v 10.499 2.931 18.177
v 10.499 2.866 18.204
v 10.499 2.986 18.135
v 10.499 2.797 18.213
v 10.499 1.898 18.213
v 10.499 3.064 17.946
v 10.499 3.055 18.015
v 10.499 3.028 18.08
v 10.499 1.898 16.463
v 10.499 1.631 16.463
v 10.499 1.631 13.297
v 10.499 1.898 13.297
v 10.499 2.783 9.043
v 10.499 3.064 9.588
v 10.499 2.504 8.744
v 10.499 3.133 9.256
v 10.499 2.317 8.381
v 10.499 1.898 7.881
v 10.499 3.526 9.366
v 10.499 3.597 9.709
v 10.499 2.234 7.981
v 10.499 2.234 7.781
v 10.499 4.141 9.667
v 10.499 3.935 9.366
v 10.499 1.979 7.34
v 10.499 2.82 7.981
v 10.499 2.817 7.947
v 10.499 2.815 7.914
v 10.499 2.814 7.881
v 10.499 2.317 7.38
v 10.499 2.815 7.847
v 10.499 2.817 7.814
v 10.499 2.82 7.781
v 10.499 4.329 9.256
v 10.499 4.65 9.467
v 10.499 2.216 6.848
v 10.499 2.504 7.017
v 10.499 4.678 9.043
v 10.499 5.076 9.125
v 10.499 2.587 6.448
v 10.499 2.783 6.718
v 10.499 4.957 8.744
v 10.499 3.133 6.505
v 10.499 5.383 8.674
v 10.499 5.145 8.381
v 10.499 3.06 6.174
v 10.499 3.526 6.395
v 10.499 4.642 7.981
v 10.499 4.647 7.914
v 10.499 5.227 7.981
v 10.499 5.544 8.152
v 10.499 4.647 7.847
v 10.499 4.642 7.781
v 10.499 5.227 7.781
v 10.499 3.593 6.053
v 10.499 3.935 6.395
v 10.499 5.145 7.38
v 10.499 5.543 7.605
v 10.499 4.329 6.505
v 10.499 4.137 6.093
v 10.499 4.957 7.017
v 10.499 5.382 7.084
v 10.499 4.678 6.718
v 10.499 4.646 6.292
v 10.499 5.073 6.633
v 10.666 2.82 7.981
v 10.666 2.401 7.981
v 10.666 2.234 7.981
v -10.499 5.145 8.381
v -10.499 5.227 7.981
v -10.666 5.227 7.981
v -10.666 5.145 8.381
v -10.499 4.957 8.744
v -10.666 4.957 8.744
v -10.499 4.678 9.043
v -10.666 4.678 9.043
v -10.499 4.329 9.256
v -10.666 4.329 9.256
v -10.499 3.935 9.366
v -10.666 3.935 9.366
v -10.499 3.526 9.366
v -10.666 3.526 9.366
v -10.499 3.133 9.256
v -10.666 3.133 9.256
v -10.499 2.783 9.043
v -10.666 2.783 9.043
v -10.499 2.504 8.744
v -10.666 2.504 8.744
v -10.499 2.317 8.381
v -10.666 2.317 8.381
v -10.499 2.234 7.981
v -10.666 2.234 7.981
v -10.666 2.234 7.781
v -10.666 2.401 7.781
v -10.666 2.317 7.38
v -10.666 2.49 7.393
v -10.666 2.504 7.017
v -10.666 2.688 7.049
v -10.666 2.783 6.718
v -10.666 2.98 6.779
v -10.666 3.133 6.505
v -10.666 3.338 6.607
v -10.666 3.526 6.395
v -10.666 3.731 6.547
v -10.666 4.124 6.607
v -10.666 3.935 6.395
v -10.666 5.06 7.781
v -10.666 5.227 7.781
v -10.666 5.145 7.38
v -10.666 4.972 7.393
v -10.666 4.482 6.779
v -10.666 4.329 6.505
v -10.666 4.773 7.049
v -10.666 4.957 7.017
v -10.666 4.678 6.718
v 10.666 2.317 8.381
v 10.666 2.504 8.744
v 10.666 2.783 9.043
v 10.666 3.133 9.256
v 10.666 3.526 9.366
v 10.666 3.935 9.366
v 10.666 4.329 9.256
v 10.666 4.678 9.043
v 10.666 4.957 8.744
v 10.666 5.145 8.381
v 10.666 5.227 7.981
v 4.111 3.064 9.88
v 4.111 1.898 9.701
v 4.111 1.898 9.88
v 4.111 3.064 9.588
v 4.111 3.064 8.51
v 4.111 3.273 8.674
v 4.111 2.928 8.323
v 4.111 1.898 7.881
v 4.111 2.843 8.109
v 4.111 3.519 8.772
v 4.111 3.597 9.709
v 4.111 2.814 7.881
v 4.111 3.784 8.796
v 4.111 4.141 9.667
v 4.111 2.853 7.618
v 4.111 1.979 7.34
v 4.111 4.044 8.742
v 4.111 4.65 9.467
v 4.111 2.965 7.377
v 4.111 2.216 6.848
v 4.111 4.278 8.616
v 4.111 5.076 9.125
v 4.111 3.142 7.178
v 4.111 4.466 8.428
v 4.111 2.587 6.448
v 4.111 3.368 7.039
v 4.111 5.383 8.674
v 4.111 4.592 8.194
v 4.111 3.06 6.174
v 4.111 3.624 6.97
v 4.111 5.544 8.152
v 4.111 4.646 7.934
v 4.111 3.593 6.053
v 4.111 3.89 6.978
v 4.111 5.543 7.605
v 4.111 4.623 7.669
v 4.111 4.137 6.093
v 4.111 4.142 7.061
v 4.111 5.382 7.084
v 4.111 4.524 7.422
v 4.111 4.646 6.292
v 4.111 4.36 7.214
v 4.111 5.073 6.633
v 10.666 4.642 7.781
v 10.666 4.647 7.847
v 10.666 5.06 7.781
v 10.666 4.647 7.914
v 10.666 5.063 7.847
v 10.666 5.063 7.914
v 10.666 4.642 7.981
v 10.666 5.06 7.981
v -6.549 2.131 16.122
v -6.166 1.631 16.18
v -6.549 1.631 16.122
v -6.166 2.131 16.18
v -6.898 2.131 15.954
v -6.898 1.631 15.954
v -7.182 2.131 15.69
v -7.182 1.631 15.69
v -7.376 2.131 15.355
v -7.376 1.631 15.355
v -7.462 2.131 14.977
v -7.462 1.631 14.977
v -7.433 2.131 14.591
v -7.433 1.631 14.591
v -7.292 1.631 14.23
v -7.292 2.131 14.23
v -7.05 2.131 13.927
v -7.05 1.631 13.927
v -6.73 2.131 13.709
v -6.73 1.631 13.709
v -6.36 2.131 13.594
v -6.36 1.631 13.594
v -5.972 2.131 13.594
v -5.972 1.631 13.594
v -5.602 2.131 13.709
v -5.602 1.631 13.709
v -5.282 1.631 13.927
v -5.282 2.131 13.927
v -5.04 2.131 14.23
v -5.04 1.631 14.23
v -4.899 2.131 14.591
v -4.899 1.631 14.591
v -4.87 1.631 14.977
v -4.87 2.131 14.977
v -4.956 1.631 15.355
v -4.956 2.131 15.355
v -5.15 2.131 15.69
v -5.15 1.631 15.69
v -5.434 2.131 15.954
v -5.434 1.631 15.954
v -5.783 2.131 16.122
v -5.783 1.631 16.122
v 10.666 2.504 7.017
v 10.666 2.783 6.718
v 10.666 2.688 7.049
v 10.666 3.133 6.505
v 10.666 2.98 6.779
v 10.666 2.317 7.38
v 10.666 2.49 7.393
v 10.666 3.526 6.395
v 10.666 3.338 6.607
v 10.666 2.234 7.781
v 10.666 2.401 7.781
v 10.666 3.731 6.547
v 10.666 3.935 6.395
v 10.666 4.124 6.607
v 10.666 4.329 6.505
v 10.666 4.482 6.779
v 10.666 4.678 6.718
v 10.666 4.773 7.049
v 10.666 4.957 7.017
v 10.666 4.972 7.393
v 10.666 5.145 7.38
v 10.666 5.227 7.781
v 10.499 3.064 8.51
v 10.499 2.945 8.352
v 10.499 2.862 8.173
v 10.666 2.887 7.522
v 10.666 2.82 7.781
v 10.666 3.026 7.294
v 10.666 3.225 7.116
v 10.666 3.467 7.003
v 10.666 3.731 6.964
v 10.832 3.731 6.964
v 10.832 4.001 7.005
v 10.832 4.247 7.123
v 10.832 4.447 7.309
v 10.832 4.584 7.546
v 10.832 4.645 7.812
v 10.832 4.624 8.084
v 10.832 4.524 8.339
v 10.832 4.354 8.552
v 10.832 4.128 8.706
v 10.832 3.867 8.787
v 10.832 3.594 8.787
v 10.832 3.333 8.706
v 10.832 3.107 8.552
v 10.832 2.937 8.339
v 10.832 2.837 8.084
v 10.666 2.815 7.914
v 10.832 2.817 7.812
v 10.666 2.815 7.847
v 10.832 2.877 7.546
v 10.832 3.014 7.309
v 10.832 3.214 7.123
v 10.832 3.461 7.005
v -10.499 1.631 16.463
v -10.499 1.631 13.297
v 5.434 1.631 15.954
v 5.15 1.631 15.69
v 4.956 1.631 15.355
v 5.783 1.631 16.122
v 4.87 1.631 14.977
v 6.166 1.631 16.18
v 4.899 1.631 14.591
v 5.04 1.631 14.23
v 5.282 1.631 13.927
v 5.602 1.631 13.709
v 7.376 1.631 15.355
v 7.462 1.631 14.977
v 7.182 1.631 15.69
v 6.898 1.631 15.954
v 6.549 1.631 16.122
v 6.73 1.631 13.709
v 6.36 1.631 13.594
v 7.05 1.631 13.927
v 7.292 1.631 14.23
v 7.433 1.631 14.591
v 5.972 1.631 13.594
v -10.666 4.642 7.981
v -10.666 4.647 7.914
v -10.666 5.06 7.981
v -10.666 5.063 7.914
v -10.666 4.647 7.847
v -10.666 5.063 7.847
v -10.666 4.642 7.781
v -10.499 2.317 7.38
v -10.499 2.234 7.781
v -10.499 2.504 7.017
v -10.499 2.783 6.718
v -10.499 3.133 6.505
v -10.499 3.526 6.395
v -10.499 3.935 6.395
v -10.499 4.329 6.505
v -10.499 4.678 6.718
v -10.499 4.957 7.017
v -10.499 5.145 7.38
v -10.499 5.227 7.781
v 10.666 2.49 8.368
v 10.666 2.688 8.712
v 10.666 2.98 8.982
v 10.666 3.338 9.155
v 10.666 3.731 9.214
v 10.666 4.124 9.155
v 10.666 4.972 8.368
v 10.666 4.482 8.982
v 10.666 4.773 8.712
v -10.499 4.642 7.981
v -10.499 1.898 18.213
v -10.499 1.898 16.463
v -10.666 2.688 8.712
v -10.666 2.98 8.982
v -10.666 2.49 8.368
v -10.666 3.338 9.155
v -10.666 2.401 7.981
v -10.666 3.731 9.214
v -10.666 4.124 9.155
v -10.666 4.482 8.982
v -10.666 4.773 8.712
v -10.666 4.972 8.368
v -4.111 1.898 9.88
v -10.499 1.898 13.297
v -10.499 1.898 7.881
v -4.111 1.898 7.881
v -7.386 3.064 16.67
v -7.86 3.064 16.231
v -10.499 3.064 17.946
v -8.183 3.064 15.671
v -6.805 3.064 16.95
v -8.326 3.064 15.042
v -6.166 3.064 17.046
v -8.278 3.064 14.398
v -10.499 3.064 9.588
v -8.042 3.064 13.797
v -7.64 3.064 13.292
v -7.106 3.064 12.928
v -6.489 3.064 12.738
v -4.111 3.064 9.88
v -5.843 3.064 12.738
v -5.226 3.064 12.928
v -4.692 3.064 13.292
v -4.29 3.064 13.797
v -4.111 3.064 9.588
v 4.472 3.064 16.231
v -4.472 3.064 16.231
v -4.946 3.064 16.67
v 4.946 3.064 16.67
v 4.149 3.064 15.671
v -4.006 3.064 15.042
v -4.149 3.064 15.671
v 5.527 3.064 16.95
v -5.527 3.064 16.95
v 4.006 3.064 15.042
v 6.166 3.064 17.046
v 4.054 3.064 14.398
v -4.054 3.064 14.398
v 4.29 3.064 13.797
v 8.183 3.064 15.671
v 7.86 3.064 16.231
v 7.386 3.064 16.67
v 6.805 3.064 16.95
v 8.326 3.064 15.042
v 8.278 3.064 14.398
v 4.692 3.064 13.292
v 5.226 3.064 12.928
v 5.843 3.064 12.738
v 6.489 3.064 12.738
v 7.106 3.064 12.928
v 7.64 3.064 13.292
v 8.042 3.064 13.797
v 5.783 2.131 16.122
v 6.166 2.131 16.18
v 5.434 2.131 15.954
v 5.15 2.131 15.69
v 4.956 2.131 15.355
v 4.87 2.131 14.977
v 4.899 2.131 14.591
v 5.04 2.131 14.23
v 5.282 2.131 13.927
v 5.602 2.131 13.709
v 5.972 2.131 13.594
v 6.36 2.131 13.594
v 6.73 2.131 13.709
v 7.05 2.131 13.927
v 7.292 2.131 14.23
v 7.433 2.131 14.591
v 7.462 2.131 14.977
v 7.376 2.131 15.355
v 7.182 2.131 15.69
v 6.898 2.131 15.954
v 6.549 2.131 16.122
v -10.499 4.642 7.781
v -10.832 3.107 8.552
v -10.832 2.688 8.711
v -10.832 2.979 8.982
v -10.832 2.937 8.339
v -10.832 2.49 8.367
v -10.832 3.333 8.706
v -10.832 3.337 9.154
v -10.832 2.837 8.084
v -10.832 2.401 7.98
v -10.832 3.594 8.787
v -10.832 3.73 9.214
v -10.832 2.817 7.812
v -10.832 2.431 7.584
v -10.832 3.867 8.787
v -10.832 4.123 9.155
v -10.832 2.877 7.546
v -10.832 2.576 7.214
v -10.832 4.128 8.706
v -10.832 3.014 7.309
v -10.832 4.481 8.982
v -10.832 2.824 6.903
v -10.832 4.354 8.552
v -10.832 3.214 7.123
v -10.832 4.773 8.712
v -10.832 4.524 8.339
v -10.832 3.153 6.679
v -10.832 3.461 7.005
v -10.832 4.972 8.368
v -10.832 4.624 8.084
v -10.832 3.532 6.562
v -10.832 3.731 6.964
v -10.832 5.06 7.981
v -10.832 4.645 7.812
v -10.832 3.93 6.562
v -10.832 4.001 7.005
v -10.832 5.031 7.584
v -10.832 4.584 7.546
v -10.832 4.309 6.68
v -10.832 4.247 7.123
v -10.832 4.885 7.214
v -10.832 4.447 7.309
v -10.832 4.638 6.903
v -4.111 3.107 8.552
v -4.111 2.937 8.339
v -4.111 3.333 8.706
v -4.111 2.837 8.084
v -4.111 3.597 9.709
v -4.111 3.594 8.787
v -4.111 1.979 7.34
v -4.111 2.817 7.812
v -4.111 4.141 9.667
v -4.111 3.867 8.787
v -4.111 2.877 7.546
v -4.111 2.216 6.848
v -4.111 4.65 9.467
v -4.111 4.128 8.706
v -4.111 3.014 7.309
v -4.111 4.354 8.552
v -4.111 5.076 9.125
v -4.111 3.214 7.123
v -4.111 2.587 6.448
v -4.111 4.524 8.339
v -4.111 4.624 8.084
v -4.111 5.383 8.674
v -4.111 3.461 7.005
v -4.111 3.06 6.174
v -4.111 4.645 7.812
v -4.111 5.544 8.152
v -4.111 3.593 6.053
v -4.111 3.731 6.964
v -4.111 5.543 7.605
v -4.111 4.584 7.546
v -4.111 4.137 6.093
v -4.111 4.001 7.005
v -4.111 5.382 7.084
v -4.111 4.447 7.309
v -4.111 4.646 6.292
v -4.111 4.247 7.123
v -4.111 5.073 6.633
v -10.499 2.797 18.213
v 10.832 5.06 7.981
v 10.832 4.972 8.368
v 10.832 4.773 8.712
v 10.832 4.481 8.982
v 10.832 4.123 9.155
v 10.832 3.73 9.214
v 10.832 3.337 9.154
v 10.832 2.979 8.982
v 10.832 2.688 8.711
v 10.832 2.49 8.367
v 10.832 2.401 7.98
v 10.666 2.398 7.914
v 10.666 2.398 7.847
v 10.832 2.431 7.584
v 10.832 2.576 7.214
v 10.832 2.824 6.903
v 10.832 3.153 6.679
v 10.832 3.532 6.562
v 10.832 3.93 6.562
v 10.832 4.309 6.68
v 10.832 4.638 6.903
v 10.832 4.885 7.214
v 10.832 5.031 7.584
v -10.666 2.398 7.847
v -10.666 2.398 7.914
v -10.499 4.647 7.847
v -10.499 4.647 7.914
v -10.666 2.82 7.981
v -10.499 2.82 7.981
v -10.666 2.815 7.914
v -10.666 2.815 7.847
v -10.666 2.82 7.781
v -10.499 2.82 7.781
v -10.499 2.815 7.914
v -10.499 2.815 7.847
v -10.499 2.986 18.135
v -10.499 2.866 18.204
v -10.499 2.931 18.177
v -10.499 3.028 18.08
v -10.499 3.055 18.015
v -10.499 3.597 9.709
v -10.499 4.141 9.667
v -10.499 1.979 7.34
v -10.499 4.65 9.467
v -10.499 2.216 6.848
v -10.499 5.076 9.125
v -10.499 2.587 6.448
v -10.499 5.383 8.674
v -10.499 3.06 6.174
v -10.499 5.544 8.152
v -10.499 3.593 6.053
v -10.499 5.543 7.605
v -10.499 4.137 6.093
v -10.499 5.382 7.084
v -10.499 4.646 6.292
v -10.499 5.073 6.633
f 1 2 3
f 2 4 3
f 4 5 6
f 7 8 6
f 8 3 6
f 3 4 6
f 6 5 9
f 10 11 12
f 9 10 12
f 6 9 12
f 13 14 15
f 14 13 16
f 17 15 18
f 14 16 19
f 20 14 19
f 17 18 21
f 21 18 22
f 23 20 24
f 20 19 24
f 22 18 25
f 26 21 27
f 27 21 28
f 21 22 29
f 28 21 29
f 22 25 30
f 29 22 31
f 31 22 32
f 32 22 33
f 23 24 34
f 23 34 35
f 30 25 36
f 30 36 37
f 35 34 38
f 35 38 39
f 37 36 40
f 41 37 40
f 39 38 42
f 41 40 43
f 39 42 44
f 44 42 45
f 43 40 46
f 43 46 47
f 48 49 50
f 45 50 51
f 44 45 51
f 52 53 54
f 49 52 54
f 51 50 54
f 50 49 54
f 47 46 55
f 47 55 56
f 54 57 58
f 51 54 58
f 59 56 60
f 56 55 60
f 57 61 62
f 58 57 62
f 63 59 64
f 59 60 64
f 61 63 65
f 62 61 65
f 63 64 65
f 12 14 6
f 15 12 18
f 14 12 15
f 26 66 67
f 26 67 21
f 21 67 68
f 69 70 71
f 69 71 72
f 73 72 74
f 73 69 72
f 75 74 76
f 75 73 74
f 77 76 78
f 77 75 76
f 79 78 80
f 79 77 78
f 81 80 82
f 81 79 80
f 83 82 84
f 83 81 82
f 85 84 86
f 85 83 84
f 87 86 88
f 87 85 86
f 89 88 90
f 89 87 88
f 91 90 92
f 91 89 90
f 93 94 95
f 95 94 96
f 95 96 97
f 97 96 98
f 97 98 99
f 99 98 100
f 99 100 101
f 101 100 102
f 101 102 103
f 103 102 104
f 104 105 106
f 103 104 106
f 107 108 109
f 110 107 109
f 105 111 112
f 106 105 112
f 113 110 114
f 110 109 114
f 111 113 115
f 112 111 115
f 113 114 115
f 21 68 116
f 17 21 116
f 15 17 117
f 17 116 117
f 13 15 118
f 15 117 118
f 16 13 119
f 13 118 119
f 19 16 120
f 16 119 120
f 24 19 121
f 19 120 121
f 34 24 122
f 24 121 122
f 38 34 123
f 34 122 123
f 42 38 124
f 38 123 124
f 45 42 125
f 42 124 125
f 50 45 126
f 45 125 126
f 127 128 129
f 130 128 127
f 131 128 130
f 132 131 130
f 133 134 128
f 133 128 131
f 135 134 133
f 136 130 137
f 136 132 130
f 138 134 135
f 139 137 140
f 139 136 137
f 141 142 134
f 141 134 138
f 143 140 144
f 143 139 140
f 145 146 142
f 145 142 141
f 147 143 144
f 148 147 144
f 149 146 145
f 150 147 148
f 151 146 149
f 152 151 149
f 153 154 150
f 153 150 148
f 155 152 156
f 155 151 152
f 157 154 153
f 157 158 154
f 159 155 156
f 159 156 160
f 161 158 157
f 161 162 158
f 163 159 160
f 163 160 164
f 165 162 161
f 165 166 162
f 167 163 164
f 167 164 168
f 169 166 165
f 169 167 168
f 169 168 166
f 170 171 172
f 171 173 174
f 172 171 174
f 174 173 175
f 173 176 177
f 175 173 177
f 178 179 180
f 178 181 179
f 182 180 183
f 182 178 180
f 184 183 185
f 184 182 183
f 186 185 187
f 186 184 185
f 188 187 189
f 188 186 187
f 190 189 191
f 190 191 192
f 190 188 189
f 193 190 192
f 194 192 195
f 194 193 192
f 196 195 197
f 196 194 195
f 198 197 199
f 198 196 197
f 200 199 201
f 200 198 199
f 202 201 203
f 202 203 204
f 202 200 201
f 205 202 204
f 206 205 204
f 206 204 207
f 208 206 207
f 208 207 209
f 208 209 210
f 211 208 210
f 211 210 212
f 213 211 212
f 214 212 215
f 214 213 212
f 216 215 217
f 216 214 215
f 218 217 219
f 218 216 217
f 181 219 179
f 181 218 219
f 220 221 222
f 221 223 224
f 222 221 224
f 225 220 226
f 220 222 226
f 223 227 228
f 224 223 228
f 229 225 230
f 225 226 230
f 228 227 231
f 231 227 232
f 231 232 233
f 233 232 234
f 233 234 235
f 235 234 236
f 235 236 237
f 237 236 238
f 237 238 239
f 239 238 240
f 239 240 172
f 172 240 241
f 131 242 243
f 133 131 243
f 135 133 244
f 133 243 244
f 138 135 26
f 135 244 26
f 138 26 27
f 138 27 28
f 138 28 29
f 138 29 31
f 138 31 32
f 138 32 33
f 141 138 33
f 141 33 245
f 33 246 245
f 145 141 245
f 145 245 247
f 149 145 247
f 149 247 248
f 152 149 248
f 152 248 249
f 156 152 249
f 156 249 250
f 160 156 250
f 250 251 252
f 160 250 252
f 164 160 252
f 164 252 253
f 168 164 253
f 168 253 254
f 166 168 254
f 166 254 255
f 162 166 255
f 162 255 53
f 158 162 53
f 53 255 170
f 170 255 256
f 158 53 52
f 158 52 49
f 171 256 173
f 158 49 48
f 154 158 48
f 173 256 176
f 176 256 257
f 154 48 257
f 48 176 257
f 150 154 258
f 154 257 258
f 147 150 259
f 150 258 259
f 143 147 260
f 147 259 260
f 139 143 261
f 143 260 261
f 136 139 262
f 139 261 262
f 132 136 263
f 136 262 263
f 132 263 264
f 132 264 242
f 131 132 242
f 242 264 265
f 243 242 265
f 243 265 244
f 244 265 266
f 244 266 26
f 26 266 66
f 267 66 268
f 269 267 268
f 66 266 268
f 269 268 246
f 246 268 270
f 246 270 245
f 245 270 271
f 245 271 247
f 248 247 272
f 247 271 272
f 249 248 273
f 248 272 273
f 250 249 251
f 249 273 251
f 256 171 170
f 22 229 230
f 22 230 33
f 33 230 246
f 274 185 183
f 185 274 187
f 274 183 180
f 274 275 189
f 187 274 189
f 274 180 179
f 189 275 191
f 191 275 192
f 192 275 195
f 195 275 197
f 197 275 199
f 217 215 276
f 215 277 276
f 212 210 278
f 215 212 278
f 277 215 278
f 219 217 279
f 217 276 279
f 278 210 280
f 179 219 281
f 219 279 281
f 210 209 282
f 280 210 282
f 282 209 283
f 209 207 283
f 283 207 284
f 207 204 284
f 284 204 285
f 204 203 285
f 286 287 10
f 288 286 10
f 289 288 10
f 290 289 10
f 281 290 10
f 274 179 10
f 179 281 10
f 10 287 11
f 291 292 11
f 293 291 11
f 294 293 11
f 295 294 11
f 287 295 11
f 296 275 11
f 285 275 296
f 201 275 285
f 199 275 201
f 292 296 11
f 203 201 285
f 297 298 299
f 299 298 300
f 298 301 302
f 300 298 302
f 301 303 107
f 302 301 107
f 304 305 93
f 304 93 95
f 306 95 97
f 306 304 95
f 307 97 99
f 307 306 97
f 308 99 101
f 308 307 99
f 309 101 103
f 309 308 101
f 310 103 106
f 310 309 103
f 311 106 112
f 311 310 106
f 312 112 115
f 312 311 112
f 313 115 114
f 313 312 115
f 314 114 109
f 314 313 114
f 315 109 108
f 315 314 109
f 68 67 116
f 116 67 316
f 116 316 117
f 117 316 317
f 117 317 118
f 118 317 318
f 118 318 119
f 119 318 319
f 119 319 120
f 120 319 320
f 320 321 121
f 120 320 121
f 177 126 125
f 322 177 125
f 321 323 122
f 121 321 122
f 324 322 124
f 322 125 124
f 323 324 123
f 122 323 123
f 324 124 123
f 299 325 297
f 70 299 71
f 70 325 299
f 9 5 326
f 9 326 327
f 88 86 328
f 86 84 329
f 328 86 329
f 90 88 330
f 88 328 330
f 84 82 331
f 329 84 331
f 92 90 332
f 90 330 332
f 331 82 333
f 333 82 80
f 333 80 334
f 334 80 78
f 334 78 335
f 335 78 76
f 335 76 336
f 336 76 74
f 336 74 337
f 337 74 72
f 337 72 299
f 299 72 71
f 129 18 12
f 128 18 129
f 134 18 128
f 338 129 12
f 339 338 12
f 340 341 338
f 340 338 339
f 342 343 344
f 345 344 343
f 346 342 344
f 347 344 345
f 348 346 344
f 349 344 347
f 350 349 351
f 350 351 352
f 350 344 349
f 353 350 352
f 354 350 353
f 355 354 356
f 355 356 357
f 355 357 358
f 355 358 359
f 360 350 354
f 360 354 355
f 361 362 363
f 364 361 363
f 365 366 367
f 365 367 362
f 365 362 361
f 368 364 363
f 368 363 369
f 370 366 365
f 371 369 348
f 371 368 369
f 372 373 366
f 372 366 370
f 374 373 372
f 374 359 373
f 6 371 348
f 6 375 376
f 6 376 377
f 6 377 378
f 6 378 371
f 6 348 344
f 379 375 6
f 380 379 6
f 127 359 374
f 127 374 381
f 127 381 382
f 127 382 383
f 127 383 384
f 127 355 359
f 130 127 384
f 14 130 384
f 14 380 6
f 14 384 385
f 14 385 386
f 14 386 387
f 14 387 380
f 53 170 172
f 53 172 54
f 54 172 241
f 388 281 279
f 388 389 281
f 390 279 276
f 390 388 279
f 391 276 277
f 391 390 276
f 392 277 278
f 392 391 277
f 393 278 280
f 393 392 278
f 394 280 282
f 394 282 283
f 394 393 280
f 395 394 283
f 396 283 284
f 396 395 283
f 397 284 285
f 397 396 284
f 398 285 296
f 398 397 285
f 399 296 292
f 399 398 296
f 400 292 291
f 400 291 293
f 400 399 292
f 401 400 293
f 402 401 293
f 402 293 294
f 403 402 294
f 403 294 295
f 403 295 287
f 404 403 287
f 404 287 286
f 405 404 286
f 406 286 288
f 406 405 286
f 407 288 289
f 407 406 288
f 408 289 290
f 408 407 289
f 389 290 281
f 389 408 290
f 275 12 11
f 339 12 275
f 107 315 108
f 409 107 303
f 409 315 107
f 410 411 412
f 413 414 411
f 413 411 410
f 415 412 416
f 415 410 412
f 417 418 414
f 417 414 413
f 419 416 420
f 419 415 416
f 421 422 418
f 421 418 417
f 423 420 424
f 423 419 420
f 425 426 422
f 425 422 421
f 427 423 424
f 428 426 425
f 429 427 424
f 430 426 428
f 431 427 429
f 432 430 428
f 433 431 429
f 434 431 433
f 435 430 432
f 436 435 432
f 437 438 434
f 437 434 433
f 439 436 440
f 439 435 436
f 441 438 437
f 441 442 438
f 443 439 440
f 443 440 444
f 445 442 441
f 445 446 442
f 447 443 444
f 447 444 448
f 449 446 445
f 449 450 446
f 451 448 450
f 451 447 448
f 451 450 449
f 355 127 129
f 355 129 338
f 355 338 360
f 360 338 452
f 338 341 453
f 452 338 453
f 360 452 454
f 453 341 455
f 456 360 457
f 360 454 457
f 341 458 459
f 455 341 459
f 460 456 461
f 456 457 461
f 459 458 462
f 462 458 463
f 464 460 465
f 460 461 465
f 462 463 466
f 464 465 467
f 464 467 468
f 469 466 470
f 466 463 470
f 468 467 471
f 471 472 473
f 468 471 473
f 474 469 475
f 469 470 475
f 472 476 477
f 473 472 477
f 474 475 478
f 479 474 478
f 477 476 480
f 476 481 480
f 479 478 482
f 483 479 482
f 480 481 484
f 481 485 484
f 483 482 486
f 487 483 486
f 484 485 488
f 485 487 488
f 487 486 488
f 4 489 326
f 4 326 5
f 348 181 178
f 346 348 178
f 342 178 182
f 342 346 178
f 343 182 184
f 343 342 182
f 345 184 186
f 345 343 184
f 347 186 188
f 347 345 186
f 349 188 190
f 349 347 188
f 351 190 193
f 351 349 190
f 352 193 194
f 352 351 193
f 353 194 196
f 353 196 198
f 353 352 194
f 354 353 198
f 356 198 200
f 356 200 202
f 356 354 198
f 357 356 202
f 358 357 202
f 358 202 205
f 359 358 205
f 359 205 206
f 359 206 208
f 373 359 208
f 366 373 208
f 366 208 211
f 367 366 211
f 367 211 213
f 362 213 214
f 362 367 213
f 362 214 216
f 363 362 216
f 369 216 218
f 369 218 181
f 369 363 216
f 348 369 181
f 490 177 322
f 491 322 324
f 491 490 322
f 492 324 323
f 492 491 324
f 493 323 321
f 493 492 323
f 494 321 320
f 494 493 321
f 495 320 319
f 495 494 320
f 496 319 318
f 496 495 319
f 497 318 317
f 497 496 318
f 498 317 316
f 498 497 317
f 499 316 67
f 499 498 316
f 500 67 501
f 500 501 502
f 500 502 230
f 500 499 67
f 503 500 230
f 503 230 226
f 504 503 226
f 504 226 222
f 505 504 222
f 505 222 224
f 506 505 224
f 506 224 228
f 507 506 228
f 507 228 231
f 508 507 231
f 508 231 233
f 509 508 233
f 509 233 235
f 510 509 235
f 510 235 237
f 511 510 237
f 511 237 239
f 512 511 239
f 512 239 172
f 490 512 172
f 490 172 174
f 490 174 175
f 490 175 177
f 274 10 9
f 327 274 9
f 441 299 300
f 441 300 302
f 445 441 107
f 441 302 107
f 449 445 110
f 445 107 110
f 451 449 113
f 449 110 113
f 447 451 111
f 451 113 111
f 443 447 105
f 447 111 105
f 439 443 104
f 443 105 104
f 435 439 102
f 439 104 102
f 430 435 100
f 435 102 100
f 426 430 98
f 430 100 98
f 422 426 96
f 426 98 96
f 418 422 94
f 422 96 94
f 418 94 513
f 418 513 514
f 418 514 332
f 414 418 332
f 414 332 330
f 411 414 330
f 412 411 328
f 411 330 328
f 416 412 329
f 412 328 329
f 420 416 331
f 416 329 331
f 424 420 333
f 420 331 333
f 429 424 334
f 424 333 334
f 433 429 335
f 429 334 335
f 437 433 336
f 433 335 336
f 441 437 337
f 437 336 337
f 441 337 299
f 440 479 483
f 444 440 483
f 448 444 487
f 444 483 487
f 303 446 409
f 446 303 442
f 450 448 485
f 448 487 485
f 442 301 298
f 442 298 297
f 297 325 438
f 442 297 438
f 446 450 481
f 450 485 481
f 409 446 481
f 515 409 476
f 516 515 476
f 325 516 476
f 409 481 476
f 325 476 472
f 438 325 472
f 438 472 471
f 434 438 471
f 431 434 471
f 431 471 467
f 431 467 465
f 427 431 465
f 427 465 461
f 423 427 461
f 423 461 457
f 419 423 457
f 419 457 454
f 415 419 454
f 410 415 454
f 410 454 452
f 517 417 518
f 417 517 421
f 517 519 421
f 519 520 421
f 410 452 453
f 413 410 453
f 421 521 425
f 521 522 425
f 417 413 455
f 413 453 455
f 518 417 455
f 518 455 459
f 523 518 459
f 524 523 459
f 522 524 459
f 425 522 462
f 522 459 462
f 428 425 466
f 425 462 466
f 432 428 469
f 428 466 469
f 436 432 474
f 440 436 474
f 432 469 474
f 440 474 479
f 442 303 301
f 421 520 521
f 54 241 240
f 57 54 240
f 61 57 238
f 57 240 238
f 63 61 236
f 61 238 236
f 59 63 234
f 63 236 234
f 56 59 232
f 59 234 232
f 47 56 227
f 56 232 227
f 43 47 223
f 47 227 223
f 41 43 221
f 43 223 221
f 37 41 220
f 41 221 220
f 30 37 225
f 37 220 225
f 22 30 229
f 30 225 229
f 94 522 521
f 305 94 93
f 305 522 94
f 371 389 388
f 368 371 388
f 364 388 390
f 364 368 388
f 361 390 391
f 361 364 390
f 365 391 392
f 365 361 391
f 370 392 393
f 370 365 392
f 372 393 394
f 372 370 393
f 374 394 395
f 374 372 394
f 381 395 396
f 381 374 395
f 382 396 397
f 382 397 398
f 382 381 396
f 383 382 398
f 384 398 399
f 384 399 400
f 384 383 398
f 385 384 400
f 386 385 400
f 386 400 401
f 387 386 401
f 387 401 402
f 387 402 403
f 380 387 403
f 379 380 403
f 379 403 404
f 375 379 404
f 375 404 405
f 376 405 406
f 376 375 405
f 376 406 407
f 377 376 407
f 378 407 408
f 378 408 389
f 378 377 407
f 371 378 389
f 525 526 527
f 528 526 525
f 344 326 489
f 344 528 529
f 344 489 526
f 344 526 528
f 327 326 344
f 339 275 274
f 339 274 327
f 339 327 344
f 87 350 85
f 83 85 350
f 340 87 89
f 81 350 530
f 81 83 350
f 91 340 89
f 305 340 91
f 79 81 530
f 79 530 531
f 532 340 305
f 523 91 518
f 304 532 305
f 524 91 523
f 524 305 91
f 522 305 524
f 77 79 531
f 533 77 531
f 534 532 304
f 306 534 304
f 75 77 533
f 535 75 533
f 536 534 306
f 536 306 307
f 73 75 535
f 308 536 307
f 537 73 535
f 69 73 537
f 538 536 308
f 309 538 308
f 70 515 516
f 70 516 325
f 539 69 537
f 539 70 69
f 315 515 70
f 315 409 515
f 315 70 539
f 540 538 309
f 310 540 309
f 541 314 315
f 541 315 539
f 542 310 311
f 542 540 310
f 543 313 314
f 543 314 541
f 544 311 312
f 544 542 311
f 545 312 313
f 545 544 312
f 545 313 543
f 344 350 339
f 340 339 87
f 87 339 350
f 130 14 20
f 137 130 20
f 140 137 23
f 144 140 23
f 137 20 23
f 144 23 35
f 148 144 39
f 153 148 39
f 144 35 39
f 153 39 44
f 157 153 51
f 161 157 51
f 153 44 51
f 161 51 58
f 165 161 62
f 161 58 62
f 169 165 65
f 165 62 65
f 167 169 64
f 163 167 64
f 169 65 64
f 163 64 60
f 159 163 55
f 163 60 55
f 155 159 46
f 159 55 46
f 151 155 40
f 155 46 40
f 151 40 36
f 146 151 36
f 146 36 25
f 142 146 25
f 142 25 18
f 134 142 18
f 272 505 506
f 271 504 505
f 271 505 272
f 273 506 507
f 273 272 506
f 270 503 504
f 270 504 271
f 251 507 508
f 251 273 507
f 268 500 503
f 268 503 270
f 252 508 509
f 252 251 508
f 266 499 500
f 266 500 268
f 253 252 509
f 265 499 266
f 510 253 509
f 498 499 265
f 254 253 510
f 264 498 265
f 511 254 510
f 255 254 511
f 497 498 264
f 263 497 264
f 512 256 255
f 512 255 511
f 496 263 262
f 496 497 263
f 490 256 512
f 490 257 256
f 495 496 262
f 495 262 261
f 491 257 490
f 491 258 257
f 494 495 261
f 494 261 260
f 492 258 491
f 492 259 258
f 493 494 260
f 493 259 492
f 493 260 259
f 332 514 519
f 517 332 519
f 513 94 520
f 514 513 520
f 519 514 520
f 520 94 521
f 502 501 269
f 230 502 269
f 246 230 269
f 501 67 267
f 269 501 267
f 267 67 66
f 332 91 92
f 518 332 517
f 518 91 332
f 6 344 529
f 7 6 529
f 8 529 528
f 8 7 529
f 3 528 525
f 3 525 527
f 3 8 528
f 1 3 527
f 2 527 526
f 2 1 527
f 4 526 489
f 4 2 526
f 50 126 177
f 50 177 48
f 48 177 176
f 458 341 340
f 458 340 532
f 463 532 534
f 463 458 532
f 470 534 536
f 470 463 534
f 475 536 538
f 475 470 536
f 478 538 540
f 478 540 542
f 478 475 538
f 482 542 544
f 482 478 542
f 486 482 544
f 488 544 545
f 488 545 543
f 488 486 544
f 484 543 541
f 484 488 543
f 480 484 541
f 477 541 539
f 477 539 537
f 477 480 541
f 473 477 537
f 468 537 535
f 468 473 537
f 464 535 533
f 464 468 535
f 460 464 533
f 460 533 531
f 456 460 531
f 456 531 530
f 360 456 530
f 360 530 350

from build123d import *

# Parameters (mm, degrees)
BOSS_EXTRUDE1_DEPTH    = 19.166666667
BOSS_EXTRUDE2_DEPTH    = 0.5
SKETCH3_W              = 5.123475383
SKETCH3_H              = 3.5
BOSS_EXTRUDE3_DEPTH    = 24.666666667
BOSS_EXTRUDE4_START    = 19.166666667
BOSS_EXTRUDE4_DEPTH    = 19.166666667
BOSS_EXTRUDE5_START    = 0.5
BOSS_EXTRUDE5_DEPTH    = 0.5
BOSS_EXTRUDE6_START    = 0.5
BOSS_EXTRUDE6_DEPTH    = 0.5
CUT_EXTRUDE1_DEPTH     = 19.166666667
SKETCH8_W              = 63
SKETCH8_H              = 3.5
BOSS_EXTRUDE7_DEPTH    = 0.338316441
SKETCH9_W              = 63
SKETCH9_H              = 5.461791824
BOSS_EXTRUDE8_DEPTH    = 0.8
CUT_EXTRUDE2_DEPTH     = 5.123475383
SKETCH11_W             = 63
SKETCH11_H             = 4.3
BOSS_EXTRUDE9_DEPTH    = 25.538208176
CUT_EXTRUDE3_DEPTH     = 0.338316441
SKETCH13_W             = 63
SKETCH13_H             = 0.8
CUT_EXTRUDE4_DEPTH     = 10.788208176
SKETCH14_W             = 24.666666666
SKETCH14_H             = 3.5
CUT_EXTRUDE5_DEPTH     = 0.538208176
BOSS_EXTRUDE10_START   = 0.5
SKETCH15_R             = 4
SKETCH15_R_2           = 2.75
BOSS_EXTRUDE10_DEPTH   = 0.5
SKETCH16_R             = 4
BOSS_EXTRUDE11_DEPTH   = 0.5
SKETCH17_W             = 5.25
SKETCH17_H             = 0.8
CUT_EXTRUDE6_DEPTH     = 72.95832127
F_10_CLEARANCE_HOLE1_D = 5.5
HOLE1_AT_2_COUNT       = 2
HOLE1_AT_2_PITCH       = 37
FILLET1_R              = 0.8
SCALE1_SCALE           = 0.3333


with BuildPart() as part:
    # Sketch1 → Boss-Extrude1 (new body)
    with BuildSketch(Plane(origin=(-12.333333333, 0, 0), x_dir=(0, 0, -1), z_dir=(1, 0, 0))):
        with BuildLine():
            Line((-5.123475383, 3.5), (-5.123475383, 0))
            Line((-5.123475383, 0), (0, 0))
            ThreePointArc((0, 0), (3.102418411, 10.041475531), (-5.123475383, 3.5))
        make_face()
    extrude(amount=-BOSS_EXTRUDE1_DEPTH)

    # Sketch2 → Boss-Extrude2 (add)
    with BuildSketch(Plane.ZY.offset(31.5)):
        with BuildLine():
            Line((-0.3, 9.989988864), (-0.3, 8.233587387))
            ThreePointArc((-0.3, 8.233587387), (0, 8.25), (0.3, 8.233587387))
            Line((0.3, 8.233587387), (0.3, 9.989988864))
            ThreePointArc((0.3, 9.989988864), (4.5, 5.5), (0.3, 1.010011136))
            Line((0.3, 1.010011136), (0.3, 2.766412613))
            ThreePointArc((0.3, 2.766412613), (0, 2.75), (-0.3, 2.766412613))
            Line((-0.3, 2.766412613), (-0.3, 1.010011136))
            ThreePointArc((-0.3, 1.010011136), (-4.5, 5.5), (-0.3, 9.989988864))
        make_face()
    extrude(amount=BOSS_EXTRUDE2_DEPTH)

    # Sketch3 → Boss-Extrude3 (add)
    with BuildSketch(Plane(origin=(-12.333333333, 0, 0), x_dir=(0, 0, -1), z_dir=(1, 0, 0))):
        with Locations((-2.561737692, 1.75)):
            Rectangle(SKETCH3_W, SKETCH3_H)
    extrude(amount=BOSS_EXTRUDE3_DEPTH)

    # Sketch4 → Boss-Extrude4 (add)
    with BuildSketch(Plane(origin=(12.333333333, 0, 0), x_dir=(0, 0, -1), z_dir=(1, 0, 0)).offset(BOSS_EXTRUDE4_START)):
        with BuildLine():
            Line((0, 0), (-5.123475383, 0))
            Line((-5.123475383, 0), (-5.123475383, 3.5))
            ThreePointArc((-5.123475383, 3.5), (3.102418411, 10.041475531), (0, 0))
        make_face()
        with BuildLine():
            Line((-1.887458609, 3.5), (0, 3.5))
            Line((0, 3.5), (0, 2.75))
            ThreePointArc((0, 2.75), (1.015504801, 8.055631038), (-1.887458609, 3.5))
        make_face(mode=Mode.SUBTRACT)
    extrude(amount=-BOSS_EXTRUDE4_DEPTH)

    # Sketch5 → Boss-Extrude5 (add)
    with BuildSketch(Plane(origin=(31.5, 0, 0), x_dir=(0, 0, -1), z_dir=(1, 0, 0)).offset(BOSS_EXTRUDE5_START)):
        with BuildLine():
            Line((-0.3, 9.989988864), (-0.3, 8.233587387))
            ThreePointArc((-0.3, 8.233587387), (-2.75, 5.5), (-0.3, 2.766412613))
            Line((-0.3, 2.766412613), (-0.3, 1.010011136))
            ThreePointArc((-0.3, 1.010011136), (-4.5, 5.5), (-0.3, 9.989988864))
        make_face()
    extrude(amount=-BOSS_EXTRUDE5_DEPTH)

    # Sketch6 → Boss-Extrude6 (add)
    with BuildSketch(Plane(origin=(31.5, 0, 0), x_dir=(0, 0, -1), z_dir=(1, 0, 0)).offset(BOSS_EXTRUDE6_START)):
        with BuildLine():
            Line((0.3, 1.010011136), (0.3, 2.766412613))
            ThreePointArc((0.3, 2.766412613), (2.75, 5.5), (0.3, 8.233587387))
            Line((0.3, 8.233587387), (0.3, 9.989988864))
            ThreePointArc((0.3, 9.989988864), (4.5, 5.5), (0.3, 1.010011136))
        make_face()
    extrude(amount=-BOSS_EXTRUDE6_DEPTH)

    # Sketch7 → Cut-Extrude1 (cut)
    with BuildSketch(Plane(origin=(31.5, 0, 0), x_dir=(0, 0, -1), z_dir=(1, 0, 0))):
        with BuildLine():
            Line((0, 3.5), (-1.887458609, 3.5))
            ThreePointArc((-1.887458609, 3.5), (-1.015504801, 2.944368962), (0, 2.75))
            Line((0, 2.75), (0, 3.5))
        make_face()
    extrude(amount=-CUT_EXTRUDE1_DEPTH, mode=Mode.SUBTRACT)

    # Sketch8 → Boss-Extrude7 (add)
    with BuildSketch(Plane.XY.offset(5.123475383)):
        with Locations((0, 1.75)):
            Rectangle(SKETCH8_W, SKETCH8_H)
    extrude(amount=BOSS_EXTRUDE7_DEPTH)

    # Sketch9 → Boss-Extrude8 (add)
    with BuildSketch(Plane.XZ):
        with Locations((0, 2.730895912)):
            Rectangle(SKETCH9_W, SKETCH9_H)
    extrude(amount=BOSS_EXTRUDE8_DEPTH)

    # Sketch10 → Cut-Extrude2 (cut)
    with BuildSketch(Plane(origin=(0, 0, 0), x_dir=(-1, 0, 0), z_dir=(0, 0, -1))):
        Polygon((12.333333333, 3.5), (-12.333333333, 3.5), (-12.333333333, 0), (-31.5, 0), (-31.5, -0.8), (31.5, -0.8), (31.5, 0), (12.333333333, 0), align=None)
    extrude(amount=-CUT_EXTRUDE2_DEPTH, mode=Mode.SUBTRACT)

    # Sketch11 → Boss-Extrude9 (add)
    with BuildSketch(Plane.XY.offset(5.461791824)):
        with Locations((0, 1.35)):
            Rectangle(SKETCH11_W, SKETCH11_H)
    extrude(amount=BOSS_EXTRUDE9_DEPTH)

    # Sketch12 → Cut-Extrude3 (cut)
    with BuildSketch(Plane(origin=(0, 0, 5.123475383), x_dir=(-1, 0, 0), z_dir=(0, 0, -1))):
        Polygon((12.333333333, 3.5), (-12.333333333, 3.5), (-12.333333333, 0), (-31.5, 0), (-31.5, -0.8), (31.5, -0.8), (31.5, 0), (12.333333333, 0), align=None)
    extrude(amount=-CUT_EXTRUDE3_DEPTH, mode=Mode.SUBTRACT)

    # Sketch13 → Cut-Extrude4 (cut)
    with BuildSketch(Plane(origin=(0, 0, 5.461791824), x_dir=(-1, 0, 0), z_dir=(0, 0, -1))):
        with Locations((0, -0.4)):
            Rectangle(SKETCH13_W, SKETCH13_H)
    extrude(amount=-CUT_EXTRUDE4_DEPTH, mode=Mode.SUBTRACT)

    # Sketch14 → Cut-Extrude5 (cut)
    with BuildSketch(Plane(origin=(0, 0, 5.461791824), x_dir=(-1, 0, 0), z_dir=(0, 0, -1))):
        with Locations((0, 1.75)):
            Rectangle(SKETCH14_W, SKETCH14_H)
    extrude(amount=-CUT_EXTRUDE5_DEPTH, mode=Mode.SUBTRACT)

    # Sketch15 → Boss-Extrude10 (add)
    with BuildSketch(Plane(origin=(32, 0, 0), x_dir=(0, 0, -1), z_dir=(1, 0, 0)).offset(BOSS_EXTRUDE10_START)):
        with Locations(Location((0, 5.5, 0), (0, 0, 94.301222305))):
            Circle(SKETCH15_R)
        with Locations((0, 5.5)):
            Circle(SKETCH15_R_2, mode=Mode.SUBTRACT)
    extrude(amount=-BOSS_EXTRUDE10_DEPTH)

    # Sketch16 → Boss-Extrude11 (add)
    with BuildSketch(Plane.ZY.offset(32)):
        with Locations(Location((0, 5.5, 0), (0, 0, 85.698777695))):
            Circle(SKETCH16_R)
    extrude(amount=BOSS_EXTRUDE11_DEPTH)

    # Sketch17 → Cut-Extrude6 (cut, through all)
    with BuildSketch(Plane(origin=(31.5, 0, 0), x_dir=(0, 0, -1), z_dir=(1, 0, 0))):
        with Locations((-28.375, -0.4)):
            Rectangle(SKETCH17_W, SKETCH17_H)
    extrude(amount=-CUT_EXTRUDE6_DEPTH, mode=Mode.SUBTRACT)

    # #10 Clearance Hole1 (through all)
    with Locations(Plane.ZY.offset(32.5)):
        with Locations((0, 5.5)):
            Hole(F_10_CLEARANCE_HOLE1_D / 2)

    # Sketch20 → Hole1 (revolve, cut)
    with BuildSketch(Plane(origin=(18.5, 3.5, 21), x_dir=(0, 0, 1), z_dir=(1, 0, 0))):
        Polygon((0, 0), (0, 4.3), (3.9, 4.3), (3.9, 2.8), (6.5, 0), align=None)
    hole1 = revolve(axis=Axis((18.5, 9.945314094, 21), (0, -1, 0)), mode=Mode.SUBTRACT)

    # Hole1 at 2: Hole1 ×2
    with Locations(*[(-i * HOLE1_AT_2_PITCH, 0, 0) for i in range(1, HOLE1_AT_2_COUNT)]):
        add(hole1, mode=Mode.SUBTRACT)

    # Fillet1
    fillet1_edges = [part.edges().sort_by_distance(p)[0] for p in [
        (0, 3.5, 31),
    ]]
    fillet(fillet1_edges, radius=FILLET1_R)


with BuildPart() as part_1:
    # Scale1: scaled about (0, 2.846153953, 11.820192401)
    add(part.part.scale(SCALE1_SCALE).moved(Location((0, 1.89753084, 7.880522274))))


solid = part_1.part
